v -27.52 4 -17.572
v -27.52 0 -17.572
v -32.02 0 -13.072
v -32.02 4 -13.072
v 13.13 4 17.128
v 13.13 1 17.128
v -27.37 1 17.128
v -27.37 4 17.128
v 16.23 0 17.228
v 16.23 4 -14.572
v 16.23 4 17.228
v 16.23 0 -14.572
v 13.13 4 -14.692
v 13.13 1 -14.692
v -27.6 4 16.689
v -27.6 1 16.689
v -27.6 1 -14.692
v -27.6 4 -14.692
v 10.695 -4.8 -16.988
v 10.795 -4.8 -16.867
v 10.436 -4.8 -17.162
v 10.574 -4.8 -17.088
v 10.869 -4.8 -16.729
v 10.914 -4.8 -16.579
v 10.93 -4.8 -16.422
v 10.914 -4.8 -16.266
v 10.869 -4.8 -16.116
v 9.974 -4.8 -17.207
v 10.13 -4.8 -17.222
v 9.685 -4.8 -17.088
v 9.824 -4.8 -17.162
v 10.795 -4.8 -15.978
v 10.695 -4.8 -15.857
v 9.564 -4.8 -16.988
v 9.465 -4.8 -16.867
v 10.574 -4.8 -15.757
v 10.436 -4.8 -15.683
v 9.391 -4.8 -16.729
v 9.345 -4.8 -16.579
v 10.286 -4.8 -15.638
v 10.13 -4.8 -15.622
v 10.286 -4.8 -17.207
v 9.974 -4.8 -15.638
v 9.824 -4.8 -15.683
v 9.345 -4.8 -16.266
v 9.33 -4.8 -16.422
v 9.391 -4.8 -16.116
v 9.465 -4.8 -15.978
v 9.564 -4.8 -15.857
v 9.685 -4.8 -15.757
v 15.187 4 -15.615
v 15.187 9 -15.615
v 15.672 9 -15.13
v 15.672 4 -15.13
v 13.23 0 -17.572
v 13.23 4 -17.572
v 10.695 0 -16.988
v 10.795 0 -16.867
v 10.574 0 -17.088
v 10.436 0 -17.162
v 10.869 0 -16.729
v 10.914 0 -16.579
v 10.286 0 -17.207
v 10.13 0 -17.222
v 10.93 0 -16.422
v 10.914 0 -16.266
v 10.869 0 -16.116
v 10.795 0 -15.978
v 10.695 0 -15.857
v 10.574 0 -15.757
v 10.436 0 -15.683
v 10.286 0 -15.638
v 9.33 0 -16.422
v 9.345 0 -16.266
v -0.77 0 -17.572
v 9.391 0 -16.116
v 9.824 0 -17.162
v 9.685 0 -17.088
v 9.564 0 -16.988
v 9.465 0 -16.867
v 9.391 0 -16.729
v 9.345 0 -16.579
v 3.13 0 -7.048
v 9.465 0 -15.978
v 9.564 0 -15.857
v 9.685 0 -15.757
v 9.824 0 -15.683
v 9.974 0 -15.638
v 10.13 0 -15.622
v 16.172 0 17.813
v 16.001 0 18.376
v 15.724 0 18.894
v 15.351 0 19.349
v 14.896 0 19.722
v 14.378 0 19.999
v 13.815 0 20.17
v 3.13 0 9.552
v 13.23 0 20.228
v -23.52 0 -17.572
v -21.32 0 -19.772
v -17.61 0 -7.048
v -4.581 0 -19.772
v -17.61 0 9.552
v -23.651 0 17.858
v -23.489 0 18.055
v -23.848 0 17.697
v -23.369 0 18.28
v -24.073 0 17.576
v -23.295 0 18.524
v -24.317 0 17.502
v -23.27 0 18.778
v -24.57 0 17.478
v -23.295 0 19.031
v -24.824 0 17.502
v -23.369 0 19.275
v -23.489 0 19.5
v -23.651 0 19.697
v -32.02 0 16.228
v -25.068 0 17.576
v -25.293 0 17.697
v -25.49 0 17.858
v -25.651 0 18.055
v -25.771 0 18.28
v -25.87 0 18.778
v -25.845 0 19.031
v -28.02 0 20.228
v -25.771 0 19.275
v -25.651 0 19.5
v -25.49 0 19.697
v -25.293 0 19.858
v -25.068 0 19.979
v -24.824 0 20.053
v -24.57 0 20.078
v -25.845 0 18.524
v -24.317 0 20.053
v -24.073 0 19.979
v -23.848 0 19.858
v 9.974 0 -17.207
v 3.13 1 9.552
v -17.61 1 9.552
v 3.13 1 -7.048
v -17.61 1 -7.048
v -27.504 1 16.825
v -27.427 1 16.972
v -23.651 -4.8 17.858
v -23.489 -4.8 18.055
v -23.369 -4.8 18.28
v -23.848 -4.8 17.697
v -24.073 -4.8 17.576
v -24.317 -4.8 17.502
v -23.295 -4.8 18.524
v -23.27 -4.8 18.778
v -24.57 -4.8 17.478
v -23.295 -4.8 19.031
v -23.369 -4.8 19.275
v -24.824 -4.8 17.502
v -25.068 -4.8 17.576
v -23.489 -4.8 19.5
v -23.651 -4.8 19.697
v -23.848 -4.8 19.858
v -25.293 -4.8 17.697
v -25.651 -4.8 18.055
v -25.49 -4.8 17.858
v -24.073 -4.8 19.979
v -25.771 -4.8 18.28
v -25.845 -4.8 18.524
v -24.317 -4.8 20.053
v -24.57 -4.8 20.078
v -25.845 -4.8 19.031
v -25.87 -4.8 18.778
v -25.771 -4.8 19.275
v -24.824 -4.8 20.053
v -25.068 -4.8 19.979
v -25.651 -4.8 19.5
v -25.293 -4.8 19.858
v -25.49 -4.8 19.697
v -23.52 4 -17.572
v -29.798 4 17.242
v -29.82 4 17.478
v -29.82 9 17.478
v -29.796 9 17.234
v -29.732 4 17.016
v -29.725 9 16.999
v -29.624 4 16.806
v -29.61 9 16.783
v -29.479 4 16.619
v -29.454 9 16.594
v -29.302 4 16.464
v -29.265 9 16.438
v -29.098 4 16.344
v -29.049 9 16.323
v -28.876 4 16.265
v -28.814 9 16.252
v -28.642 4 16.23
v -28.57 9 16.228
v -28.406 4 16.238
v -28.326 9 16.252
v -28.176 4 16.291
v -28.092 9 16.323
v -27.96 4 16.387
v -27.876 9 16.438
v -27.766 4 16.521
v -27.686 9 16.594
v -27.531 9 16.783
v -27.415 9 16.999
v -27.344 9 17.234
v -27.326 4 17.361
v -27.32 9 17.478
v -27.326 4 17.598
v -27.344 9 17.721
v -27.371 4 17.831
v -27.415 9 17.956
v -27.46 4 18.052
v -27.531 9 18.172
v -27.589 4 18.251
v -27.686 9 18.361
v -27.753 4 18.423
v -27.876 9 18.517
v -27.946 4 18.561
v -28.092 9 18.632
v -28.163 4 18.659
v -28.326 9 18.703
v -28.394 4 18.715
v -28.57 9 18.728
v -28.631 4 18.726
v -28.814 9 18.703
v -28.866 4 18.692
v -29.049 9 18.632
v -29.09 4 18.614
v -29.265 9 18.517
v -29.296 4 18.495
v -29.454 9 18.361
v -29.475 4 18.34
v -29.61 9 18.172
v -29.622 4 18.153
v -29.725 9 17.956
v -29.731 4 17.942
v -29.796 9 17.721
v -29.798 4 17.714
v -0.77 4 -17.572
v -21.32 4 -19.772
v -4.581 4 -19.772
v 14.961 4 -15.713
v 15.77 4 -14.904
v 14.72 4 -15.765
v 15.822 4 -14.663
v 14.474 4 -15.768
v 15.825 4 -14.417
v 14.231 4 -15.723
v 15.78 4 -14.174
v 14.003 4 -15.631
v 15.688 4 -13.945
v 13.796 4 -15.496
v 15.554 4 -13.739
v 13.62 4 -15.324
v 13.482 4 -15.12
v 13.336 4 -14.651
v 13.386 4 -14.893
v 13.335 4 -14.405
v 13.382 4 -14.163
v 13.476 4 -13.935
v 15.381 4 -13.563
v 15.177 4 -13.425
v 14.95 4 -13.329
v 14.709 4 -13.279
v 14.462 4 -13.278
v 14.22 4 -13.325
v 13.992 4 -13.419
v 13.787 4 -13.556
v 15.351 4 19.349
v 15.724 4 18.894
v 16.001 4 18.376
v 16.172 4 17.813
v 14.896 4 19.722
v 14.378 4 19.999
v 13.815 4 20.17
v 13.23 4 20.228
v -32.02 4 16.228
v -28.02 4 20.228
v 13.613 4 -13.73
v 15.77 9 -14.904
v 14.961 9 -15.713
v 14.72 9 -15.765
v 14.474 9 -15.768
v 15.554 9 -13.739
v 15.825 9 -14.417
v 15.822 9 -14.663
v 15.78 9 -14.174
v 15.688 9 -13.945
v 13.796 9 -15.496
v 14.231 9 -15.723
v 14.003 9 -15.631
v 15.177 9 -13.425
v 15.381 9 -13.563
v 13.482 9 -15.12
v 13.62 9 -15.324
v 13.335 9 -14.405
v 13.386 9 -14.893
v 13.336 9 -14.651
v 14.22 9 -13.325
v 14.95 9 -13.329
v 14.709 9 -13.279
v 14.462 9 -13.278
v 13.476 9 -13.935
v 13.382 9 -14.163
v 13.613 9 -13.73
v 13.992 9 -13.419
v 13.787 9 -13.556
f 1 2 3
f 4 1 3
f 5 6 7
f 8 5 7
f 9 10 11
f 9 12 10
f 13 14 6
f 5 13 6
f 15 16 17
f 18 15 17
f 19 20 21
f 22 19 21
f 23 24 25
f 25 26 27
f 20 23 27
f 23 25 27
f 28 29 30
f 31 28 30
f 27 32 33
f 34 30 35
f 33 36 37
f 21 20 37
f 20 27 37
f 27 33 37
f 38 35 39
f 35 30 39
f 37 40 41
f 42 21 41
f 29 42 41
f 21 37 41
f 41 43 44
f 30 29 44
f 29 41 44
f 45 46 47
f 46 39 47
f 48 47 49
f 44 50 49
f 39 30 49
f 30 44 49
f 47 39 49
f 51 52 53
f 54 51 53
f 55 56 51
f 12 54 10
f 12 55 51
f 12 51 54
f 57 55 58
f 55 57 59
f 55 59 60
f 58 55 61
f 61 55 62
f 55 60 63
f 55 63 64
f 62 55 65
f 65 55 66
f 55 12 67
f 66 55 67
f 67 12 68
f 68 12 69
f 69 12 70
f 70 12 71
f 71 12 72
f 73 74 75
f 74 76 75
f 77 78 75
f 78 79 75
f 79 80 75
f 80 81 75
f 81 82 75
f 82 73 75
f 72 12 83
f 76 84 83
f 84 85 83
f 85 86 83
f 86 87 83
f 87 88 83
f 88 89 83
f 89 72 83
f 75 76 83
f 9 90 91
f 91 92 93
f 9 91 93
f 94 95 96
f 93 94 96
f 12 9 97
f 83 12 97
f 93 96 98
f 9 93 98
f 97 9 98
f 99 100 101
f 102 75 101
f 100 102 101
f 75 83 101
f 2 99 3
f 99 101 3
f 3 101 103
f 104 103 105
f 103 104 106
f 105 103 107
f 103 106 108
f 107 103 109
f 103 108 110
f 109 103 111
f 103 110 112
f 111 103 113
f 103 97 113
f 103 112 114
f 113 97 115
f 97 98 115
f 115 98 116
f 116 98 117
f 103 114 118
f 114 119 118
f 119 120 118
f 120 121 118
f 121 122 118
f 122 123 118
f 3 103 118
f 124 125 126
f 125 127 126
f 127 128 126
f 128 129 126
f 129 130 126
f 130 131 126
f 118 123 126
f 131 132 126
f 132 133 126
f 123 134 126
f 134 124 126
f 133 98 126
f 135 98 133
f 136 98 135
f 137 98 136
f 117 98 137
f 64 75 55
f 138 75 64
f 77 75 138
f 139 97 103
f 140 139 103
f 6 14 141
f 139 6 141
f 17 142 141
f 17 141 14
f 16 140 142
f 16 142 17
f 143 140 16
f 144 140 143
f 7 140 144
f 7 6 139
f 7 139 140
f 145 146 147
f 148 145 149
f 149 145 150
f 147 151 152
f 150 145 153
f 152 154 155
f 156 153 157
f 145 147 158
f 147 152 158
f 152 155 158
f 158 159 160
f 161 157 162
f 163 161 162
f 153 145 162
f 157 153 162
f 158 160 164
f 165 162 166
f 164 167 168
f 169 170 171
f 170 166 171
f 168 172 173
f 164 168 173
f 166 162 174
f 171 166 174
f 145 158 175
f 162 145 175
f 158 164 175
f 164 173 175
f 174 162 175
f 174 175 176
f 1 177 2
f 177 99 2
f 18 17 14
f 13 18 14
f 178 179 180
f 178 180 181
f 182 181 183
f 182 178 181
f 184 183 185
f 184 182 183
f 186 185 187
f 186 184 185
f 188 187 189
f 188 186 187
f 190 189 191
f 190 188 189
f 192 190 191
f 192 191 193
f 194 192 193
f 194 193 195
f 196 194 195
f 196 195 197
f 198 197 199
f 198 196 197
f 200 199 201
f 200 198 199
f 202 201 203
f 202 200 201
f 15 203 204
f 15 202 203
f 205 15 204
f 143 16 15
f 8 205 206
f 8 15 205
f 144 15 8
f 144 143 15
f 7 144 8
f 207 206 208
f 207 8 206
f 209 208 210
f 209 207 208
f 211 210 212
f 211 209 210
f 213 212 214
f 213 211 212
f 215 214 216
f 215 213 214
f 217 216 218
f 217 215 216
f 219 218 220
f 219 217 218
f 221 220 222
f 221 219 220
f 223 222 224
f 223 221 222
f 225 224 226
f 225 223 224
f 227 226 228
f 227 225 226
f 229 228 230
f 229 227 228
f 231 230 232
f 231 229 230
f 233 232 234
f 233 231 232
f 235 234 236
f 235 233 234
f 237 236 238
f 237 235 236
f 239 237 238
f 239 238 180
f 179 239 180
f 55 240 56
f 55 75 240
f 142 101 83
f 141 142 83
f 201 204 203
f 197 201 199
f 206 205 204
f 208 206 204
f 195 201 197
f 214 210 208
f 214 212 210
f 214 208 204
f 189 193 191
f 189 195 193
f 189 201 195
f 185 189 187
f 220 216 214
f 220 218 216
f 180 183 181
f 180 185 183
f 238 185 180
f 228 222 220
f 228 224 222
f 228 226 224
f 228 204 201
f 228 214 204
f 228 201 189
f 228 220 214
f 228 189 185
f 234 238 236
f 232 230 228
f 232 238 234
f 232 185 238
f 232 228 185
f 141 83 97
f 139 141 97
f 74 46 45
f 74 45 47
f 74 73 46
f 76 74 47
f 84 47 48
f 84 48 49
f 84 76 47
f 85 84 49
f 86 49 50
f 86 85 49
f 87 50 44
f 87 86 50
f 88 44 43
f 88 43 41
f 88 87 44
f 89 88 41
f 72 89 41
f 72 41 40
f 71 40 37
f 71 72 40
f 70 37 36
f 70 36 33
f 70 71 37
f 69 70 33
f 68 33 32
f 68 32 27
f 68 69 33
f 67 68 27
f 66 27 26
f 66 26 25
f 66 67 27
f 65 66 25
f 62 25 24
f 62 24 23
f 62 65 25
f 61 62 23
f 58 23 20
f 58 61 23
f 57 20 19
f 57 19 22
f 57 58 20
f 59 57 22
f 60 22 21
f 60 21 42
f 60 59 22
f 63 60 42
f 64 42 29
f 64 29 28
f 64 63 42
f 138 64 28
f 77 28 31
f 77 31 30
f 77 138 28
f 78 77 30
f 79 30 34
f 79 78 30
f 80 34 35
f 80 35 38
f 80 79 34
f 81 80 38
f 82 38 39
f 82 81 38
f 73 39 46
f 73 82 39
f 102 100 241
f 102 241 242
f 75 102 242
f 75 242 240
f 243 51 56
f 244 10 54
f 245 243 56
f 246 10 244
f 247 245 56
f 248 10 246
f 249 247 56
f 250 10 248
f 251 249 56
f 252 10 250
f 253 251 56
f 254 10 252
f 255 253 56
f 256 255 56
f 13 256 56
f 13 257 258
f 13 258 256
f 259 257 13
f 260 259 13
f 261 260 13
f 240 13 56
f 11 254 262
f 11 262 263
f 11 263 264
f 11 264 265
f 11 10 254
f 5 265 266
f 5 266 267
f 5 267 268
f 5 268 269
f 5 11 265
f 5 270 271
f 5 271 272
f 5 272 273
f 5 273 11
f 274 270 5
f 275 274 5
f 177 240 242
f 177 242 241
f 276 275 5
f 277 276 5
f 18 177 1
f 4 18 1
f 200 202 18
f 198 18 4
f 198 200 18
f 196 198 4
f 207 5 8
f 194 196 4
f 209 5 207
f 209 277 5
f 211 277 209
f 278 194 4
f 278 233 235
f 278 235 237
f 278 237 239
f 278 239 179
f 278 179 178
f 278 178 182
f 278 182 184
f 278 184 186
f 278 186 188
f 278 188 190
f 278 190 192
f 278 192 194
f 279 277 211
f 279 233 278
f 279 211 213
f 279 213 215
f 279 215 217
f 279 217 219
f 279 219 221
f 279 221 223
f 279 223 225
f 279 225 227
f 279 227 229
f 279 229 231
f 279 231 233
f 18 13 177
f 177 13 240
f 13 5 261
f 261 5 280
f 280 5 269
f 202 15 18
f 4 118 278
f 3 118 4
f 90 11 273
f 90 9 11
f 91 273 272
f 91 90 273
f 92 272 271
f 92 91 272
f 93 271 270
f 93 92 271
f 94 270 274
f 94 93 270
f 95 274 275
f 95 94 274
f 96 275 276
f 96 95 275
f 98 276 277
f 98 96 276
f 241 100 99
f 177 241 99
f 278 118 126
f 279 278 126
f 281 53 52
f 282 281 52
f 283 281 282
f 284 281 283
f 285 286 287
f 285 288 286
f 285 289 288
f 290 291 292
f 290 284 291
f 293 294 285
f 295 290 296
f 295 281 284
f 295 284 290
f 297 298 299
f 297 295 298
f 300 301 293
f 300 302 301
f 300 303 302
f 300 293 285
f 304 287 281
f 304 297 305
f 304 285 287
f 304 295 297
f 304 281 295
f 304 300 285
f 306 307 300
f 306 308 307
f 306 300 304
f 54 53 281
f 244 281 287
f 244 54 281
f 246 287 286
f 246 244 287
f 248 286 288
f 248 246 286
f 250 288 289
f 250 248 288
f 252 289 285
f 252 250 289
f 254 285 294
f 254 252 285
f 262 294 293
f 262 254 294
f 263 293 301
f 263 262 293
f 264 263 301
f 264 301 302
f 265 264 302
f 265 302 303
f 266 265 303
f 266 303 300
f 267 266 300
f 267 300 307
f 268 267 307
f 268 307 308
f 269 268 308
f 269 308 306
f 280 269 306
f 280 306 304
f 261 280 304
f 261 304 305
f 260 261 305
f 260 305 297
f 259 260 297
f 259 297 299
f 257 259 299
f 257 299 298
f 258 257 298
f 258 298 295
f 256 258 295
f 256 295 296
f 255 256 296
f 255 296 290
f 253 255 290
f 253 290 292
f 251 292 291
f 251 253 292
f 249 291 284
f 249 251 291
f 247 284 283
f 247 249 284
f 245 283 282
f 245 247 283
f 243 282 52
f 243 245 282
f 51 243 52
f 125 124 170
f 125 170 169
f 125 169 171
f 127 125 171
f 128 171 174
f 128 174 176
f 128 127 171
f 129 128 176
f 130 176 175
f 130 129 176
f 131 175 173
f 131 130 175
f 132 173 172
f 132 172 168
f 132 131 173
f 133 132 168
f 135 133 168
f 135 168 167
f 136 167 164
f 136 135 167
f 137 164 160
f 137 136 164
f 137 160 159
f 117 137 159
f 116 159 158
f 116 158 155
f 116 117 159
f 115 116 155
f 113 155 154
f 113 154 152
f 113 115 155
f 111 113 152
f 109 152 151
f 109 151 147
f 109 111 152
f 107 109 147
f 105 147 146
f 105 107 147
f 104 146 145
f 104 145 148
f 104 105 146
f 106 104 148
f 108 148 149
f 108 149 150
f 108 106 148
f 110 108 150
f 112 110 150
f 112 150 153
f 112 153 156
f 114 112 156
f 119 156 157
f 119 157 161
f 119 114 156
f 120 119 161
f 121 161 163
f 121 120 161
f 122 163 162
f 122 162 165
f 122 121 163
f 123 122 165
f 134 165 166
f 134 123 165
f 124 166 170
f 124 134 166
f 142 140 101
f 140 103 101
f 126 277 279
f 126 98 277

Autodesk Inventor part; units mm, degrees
ref_plane "YZ Plane" through (0, 0, 0) normal (1, 0, 0) x (0, 1, 0)
ref_plane "XZ Plane" through (0, 0, 0) normal (0, 1, 0) x (-1, 0, 0)
ref_plane "XY Plane" through (0, 0, 0) normal (0, 0, 1) x (1, 0, 0)
sketch "Szkic1" plane through (0, 0, 0) normal (0, 1, 0) x (-1, 0, 0)
  line L0 (-3.1297, -7.0475) -> (-3.1297, 9.5525)
  line L1 (17.6103, -7.0475) -> (-3.1297, -7.0475)
  line L2 (17.6103, 9.5525) -> (17.6103, -7.0475)
  line L3 (-3.1297, 9.5525) -> (17.6103, 9.5525)
  circle A0 centre (24.5703, 18.7775) radius 1.3
  circle A1 centre (-10.1297, -16.4225) radius 0.8
  line L4 (21.3203, -19.7725) -> (4.5808, -19.7725)
  line L5 (-16.2297, -14.5725) -> (-16.2297, 17.2275)
  line L6 (-13.2297, 20.2275) -> (28.0203, 20.2275)
  line L7 (32.0203, 16.2275) -> (32.0203, -13.0725)
  circle A2 centre (24.5703, 18.7775) radius 1.25
  line L8 (32.0203, 16.2275) -> (28.0203, 20.2275)
  arc A3 (-13.2297, 20.2275) -> (-16.2297, 17.2275) centre (-13.2297, 17.2275) ccw
  line L9 (4.5808, -19.7725) -> (0.7703, -17.5725)
  line L10 (0.7703, -17.5725) -> (-13.2297, -17.5725)
  line L11 (-13.2297, -17.5725) -> (-16.2297, -14.5725)
  line L12 (21.3203, -19.7725) -> (23.5203, -17.5725)
  line L13 (23.5203, -17.5725) -> (27.5203, -17.5725)
  line L14 (27.5203, -17.5725) -> (32.0203, -13.0725)
  line L15 (-13.1297, 17.1275) -> (27.6003, 17.1275)
  line L16 (27.6003, 17.1275) -> (27.6003, -14.6925)
  line L17 (27.6003, -14.6925) -> (-13.1297, -14.6925)
  line L18 (-13.1297, -14.6925) -> (-13.1297, 17.1275)
  circle A4 centre (28.5703, 17.4775) radius 1.25
  circle A5 centre (-14.5797, -14.5225) radius 1.25
  point P0 (0, 0)
  point P1 (-27.8297, -19.2225)
  point P2 (-15.1874, -15.6149)
  point P3 (-15.6721, -15.1301)
  point P4 (27.6003, 16.6891)
  point P5 (27.3703, 17.1275)
  dimension "d0" = 48.25
  dimension "d1" = 2.5
  dimension "d2" = 1.45
  dimension "d3" = 4
  dimension "d4" = 4
  dimension "d5" = 3
  dimension "d6" = 40
  dimension "d7" = 30
  dimension "d8" = 3
  dimension "d9" = 3
  dimension "d10" = 4.5
  dimension "d11" = 4.5
  dimension "d12" = 17
  dimension "d13" = 2.2
  dimension "d14" = 45
  dimension "d15" = 10.7
  dimension "d16" = 3.1
  dimension "d17" = 3.1
  dimension "d18" = 40.73
  dimension "d19" = 31.82
  dimension "d20" = 11.6
  dimension "d27" = 2.75
  dimension "d28" = 3.45
  dimension "d29" = 1.65
  dimension "d30" = 3.05
  dimension "d31" = 2.5
  dimension "d32" = 2.5
extrude "Wyciągnięcie proste1" add sketch "Szkic1" along normal blind 4 contours A0 | A1 | L4 L9 L10 L11 A5 L5 A3 L6 L8 L7 L14 L13 L12 | L11 A5 | A2 | A4 L16 L15 picked at (-14.8001, -14.1216) picked at (29.019, 17.6576)
extrude "Wyciągnięcie proste2" add sketch "Szkic1" along normal blind 1 contours L15 A4 L16 L17 L18 | L15 L16 A4 picked at (27.5683, 16.8804)
extrude "Wyciągnięcie proste3" add sketch "Szkic1" against normal blind 4.8 contours A0 | A1 | A2
extrude "Wyciągnięcie proste4" add sketch "Szkic1" along normal blind 9 contours L11 A5 | A4 L16 L15 | L15 L16 A4 picked at (-14.8001, -14.1216)
properties part number "podstawka"
